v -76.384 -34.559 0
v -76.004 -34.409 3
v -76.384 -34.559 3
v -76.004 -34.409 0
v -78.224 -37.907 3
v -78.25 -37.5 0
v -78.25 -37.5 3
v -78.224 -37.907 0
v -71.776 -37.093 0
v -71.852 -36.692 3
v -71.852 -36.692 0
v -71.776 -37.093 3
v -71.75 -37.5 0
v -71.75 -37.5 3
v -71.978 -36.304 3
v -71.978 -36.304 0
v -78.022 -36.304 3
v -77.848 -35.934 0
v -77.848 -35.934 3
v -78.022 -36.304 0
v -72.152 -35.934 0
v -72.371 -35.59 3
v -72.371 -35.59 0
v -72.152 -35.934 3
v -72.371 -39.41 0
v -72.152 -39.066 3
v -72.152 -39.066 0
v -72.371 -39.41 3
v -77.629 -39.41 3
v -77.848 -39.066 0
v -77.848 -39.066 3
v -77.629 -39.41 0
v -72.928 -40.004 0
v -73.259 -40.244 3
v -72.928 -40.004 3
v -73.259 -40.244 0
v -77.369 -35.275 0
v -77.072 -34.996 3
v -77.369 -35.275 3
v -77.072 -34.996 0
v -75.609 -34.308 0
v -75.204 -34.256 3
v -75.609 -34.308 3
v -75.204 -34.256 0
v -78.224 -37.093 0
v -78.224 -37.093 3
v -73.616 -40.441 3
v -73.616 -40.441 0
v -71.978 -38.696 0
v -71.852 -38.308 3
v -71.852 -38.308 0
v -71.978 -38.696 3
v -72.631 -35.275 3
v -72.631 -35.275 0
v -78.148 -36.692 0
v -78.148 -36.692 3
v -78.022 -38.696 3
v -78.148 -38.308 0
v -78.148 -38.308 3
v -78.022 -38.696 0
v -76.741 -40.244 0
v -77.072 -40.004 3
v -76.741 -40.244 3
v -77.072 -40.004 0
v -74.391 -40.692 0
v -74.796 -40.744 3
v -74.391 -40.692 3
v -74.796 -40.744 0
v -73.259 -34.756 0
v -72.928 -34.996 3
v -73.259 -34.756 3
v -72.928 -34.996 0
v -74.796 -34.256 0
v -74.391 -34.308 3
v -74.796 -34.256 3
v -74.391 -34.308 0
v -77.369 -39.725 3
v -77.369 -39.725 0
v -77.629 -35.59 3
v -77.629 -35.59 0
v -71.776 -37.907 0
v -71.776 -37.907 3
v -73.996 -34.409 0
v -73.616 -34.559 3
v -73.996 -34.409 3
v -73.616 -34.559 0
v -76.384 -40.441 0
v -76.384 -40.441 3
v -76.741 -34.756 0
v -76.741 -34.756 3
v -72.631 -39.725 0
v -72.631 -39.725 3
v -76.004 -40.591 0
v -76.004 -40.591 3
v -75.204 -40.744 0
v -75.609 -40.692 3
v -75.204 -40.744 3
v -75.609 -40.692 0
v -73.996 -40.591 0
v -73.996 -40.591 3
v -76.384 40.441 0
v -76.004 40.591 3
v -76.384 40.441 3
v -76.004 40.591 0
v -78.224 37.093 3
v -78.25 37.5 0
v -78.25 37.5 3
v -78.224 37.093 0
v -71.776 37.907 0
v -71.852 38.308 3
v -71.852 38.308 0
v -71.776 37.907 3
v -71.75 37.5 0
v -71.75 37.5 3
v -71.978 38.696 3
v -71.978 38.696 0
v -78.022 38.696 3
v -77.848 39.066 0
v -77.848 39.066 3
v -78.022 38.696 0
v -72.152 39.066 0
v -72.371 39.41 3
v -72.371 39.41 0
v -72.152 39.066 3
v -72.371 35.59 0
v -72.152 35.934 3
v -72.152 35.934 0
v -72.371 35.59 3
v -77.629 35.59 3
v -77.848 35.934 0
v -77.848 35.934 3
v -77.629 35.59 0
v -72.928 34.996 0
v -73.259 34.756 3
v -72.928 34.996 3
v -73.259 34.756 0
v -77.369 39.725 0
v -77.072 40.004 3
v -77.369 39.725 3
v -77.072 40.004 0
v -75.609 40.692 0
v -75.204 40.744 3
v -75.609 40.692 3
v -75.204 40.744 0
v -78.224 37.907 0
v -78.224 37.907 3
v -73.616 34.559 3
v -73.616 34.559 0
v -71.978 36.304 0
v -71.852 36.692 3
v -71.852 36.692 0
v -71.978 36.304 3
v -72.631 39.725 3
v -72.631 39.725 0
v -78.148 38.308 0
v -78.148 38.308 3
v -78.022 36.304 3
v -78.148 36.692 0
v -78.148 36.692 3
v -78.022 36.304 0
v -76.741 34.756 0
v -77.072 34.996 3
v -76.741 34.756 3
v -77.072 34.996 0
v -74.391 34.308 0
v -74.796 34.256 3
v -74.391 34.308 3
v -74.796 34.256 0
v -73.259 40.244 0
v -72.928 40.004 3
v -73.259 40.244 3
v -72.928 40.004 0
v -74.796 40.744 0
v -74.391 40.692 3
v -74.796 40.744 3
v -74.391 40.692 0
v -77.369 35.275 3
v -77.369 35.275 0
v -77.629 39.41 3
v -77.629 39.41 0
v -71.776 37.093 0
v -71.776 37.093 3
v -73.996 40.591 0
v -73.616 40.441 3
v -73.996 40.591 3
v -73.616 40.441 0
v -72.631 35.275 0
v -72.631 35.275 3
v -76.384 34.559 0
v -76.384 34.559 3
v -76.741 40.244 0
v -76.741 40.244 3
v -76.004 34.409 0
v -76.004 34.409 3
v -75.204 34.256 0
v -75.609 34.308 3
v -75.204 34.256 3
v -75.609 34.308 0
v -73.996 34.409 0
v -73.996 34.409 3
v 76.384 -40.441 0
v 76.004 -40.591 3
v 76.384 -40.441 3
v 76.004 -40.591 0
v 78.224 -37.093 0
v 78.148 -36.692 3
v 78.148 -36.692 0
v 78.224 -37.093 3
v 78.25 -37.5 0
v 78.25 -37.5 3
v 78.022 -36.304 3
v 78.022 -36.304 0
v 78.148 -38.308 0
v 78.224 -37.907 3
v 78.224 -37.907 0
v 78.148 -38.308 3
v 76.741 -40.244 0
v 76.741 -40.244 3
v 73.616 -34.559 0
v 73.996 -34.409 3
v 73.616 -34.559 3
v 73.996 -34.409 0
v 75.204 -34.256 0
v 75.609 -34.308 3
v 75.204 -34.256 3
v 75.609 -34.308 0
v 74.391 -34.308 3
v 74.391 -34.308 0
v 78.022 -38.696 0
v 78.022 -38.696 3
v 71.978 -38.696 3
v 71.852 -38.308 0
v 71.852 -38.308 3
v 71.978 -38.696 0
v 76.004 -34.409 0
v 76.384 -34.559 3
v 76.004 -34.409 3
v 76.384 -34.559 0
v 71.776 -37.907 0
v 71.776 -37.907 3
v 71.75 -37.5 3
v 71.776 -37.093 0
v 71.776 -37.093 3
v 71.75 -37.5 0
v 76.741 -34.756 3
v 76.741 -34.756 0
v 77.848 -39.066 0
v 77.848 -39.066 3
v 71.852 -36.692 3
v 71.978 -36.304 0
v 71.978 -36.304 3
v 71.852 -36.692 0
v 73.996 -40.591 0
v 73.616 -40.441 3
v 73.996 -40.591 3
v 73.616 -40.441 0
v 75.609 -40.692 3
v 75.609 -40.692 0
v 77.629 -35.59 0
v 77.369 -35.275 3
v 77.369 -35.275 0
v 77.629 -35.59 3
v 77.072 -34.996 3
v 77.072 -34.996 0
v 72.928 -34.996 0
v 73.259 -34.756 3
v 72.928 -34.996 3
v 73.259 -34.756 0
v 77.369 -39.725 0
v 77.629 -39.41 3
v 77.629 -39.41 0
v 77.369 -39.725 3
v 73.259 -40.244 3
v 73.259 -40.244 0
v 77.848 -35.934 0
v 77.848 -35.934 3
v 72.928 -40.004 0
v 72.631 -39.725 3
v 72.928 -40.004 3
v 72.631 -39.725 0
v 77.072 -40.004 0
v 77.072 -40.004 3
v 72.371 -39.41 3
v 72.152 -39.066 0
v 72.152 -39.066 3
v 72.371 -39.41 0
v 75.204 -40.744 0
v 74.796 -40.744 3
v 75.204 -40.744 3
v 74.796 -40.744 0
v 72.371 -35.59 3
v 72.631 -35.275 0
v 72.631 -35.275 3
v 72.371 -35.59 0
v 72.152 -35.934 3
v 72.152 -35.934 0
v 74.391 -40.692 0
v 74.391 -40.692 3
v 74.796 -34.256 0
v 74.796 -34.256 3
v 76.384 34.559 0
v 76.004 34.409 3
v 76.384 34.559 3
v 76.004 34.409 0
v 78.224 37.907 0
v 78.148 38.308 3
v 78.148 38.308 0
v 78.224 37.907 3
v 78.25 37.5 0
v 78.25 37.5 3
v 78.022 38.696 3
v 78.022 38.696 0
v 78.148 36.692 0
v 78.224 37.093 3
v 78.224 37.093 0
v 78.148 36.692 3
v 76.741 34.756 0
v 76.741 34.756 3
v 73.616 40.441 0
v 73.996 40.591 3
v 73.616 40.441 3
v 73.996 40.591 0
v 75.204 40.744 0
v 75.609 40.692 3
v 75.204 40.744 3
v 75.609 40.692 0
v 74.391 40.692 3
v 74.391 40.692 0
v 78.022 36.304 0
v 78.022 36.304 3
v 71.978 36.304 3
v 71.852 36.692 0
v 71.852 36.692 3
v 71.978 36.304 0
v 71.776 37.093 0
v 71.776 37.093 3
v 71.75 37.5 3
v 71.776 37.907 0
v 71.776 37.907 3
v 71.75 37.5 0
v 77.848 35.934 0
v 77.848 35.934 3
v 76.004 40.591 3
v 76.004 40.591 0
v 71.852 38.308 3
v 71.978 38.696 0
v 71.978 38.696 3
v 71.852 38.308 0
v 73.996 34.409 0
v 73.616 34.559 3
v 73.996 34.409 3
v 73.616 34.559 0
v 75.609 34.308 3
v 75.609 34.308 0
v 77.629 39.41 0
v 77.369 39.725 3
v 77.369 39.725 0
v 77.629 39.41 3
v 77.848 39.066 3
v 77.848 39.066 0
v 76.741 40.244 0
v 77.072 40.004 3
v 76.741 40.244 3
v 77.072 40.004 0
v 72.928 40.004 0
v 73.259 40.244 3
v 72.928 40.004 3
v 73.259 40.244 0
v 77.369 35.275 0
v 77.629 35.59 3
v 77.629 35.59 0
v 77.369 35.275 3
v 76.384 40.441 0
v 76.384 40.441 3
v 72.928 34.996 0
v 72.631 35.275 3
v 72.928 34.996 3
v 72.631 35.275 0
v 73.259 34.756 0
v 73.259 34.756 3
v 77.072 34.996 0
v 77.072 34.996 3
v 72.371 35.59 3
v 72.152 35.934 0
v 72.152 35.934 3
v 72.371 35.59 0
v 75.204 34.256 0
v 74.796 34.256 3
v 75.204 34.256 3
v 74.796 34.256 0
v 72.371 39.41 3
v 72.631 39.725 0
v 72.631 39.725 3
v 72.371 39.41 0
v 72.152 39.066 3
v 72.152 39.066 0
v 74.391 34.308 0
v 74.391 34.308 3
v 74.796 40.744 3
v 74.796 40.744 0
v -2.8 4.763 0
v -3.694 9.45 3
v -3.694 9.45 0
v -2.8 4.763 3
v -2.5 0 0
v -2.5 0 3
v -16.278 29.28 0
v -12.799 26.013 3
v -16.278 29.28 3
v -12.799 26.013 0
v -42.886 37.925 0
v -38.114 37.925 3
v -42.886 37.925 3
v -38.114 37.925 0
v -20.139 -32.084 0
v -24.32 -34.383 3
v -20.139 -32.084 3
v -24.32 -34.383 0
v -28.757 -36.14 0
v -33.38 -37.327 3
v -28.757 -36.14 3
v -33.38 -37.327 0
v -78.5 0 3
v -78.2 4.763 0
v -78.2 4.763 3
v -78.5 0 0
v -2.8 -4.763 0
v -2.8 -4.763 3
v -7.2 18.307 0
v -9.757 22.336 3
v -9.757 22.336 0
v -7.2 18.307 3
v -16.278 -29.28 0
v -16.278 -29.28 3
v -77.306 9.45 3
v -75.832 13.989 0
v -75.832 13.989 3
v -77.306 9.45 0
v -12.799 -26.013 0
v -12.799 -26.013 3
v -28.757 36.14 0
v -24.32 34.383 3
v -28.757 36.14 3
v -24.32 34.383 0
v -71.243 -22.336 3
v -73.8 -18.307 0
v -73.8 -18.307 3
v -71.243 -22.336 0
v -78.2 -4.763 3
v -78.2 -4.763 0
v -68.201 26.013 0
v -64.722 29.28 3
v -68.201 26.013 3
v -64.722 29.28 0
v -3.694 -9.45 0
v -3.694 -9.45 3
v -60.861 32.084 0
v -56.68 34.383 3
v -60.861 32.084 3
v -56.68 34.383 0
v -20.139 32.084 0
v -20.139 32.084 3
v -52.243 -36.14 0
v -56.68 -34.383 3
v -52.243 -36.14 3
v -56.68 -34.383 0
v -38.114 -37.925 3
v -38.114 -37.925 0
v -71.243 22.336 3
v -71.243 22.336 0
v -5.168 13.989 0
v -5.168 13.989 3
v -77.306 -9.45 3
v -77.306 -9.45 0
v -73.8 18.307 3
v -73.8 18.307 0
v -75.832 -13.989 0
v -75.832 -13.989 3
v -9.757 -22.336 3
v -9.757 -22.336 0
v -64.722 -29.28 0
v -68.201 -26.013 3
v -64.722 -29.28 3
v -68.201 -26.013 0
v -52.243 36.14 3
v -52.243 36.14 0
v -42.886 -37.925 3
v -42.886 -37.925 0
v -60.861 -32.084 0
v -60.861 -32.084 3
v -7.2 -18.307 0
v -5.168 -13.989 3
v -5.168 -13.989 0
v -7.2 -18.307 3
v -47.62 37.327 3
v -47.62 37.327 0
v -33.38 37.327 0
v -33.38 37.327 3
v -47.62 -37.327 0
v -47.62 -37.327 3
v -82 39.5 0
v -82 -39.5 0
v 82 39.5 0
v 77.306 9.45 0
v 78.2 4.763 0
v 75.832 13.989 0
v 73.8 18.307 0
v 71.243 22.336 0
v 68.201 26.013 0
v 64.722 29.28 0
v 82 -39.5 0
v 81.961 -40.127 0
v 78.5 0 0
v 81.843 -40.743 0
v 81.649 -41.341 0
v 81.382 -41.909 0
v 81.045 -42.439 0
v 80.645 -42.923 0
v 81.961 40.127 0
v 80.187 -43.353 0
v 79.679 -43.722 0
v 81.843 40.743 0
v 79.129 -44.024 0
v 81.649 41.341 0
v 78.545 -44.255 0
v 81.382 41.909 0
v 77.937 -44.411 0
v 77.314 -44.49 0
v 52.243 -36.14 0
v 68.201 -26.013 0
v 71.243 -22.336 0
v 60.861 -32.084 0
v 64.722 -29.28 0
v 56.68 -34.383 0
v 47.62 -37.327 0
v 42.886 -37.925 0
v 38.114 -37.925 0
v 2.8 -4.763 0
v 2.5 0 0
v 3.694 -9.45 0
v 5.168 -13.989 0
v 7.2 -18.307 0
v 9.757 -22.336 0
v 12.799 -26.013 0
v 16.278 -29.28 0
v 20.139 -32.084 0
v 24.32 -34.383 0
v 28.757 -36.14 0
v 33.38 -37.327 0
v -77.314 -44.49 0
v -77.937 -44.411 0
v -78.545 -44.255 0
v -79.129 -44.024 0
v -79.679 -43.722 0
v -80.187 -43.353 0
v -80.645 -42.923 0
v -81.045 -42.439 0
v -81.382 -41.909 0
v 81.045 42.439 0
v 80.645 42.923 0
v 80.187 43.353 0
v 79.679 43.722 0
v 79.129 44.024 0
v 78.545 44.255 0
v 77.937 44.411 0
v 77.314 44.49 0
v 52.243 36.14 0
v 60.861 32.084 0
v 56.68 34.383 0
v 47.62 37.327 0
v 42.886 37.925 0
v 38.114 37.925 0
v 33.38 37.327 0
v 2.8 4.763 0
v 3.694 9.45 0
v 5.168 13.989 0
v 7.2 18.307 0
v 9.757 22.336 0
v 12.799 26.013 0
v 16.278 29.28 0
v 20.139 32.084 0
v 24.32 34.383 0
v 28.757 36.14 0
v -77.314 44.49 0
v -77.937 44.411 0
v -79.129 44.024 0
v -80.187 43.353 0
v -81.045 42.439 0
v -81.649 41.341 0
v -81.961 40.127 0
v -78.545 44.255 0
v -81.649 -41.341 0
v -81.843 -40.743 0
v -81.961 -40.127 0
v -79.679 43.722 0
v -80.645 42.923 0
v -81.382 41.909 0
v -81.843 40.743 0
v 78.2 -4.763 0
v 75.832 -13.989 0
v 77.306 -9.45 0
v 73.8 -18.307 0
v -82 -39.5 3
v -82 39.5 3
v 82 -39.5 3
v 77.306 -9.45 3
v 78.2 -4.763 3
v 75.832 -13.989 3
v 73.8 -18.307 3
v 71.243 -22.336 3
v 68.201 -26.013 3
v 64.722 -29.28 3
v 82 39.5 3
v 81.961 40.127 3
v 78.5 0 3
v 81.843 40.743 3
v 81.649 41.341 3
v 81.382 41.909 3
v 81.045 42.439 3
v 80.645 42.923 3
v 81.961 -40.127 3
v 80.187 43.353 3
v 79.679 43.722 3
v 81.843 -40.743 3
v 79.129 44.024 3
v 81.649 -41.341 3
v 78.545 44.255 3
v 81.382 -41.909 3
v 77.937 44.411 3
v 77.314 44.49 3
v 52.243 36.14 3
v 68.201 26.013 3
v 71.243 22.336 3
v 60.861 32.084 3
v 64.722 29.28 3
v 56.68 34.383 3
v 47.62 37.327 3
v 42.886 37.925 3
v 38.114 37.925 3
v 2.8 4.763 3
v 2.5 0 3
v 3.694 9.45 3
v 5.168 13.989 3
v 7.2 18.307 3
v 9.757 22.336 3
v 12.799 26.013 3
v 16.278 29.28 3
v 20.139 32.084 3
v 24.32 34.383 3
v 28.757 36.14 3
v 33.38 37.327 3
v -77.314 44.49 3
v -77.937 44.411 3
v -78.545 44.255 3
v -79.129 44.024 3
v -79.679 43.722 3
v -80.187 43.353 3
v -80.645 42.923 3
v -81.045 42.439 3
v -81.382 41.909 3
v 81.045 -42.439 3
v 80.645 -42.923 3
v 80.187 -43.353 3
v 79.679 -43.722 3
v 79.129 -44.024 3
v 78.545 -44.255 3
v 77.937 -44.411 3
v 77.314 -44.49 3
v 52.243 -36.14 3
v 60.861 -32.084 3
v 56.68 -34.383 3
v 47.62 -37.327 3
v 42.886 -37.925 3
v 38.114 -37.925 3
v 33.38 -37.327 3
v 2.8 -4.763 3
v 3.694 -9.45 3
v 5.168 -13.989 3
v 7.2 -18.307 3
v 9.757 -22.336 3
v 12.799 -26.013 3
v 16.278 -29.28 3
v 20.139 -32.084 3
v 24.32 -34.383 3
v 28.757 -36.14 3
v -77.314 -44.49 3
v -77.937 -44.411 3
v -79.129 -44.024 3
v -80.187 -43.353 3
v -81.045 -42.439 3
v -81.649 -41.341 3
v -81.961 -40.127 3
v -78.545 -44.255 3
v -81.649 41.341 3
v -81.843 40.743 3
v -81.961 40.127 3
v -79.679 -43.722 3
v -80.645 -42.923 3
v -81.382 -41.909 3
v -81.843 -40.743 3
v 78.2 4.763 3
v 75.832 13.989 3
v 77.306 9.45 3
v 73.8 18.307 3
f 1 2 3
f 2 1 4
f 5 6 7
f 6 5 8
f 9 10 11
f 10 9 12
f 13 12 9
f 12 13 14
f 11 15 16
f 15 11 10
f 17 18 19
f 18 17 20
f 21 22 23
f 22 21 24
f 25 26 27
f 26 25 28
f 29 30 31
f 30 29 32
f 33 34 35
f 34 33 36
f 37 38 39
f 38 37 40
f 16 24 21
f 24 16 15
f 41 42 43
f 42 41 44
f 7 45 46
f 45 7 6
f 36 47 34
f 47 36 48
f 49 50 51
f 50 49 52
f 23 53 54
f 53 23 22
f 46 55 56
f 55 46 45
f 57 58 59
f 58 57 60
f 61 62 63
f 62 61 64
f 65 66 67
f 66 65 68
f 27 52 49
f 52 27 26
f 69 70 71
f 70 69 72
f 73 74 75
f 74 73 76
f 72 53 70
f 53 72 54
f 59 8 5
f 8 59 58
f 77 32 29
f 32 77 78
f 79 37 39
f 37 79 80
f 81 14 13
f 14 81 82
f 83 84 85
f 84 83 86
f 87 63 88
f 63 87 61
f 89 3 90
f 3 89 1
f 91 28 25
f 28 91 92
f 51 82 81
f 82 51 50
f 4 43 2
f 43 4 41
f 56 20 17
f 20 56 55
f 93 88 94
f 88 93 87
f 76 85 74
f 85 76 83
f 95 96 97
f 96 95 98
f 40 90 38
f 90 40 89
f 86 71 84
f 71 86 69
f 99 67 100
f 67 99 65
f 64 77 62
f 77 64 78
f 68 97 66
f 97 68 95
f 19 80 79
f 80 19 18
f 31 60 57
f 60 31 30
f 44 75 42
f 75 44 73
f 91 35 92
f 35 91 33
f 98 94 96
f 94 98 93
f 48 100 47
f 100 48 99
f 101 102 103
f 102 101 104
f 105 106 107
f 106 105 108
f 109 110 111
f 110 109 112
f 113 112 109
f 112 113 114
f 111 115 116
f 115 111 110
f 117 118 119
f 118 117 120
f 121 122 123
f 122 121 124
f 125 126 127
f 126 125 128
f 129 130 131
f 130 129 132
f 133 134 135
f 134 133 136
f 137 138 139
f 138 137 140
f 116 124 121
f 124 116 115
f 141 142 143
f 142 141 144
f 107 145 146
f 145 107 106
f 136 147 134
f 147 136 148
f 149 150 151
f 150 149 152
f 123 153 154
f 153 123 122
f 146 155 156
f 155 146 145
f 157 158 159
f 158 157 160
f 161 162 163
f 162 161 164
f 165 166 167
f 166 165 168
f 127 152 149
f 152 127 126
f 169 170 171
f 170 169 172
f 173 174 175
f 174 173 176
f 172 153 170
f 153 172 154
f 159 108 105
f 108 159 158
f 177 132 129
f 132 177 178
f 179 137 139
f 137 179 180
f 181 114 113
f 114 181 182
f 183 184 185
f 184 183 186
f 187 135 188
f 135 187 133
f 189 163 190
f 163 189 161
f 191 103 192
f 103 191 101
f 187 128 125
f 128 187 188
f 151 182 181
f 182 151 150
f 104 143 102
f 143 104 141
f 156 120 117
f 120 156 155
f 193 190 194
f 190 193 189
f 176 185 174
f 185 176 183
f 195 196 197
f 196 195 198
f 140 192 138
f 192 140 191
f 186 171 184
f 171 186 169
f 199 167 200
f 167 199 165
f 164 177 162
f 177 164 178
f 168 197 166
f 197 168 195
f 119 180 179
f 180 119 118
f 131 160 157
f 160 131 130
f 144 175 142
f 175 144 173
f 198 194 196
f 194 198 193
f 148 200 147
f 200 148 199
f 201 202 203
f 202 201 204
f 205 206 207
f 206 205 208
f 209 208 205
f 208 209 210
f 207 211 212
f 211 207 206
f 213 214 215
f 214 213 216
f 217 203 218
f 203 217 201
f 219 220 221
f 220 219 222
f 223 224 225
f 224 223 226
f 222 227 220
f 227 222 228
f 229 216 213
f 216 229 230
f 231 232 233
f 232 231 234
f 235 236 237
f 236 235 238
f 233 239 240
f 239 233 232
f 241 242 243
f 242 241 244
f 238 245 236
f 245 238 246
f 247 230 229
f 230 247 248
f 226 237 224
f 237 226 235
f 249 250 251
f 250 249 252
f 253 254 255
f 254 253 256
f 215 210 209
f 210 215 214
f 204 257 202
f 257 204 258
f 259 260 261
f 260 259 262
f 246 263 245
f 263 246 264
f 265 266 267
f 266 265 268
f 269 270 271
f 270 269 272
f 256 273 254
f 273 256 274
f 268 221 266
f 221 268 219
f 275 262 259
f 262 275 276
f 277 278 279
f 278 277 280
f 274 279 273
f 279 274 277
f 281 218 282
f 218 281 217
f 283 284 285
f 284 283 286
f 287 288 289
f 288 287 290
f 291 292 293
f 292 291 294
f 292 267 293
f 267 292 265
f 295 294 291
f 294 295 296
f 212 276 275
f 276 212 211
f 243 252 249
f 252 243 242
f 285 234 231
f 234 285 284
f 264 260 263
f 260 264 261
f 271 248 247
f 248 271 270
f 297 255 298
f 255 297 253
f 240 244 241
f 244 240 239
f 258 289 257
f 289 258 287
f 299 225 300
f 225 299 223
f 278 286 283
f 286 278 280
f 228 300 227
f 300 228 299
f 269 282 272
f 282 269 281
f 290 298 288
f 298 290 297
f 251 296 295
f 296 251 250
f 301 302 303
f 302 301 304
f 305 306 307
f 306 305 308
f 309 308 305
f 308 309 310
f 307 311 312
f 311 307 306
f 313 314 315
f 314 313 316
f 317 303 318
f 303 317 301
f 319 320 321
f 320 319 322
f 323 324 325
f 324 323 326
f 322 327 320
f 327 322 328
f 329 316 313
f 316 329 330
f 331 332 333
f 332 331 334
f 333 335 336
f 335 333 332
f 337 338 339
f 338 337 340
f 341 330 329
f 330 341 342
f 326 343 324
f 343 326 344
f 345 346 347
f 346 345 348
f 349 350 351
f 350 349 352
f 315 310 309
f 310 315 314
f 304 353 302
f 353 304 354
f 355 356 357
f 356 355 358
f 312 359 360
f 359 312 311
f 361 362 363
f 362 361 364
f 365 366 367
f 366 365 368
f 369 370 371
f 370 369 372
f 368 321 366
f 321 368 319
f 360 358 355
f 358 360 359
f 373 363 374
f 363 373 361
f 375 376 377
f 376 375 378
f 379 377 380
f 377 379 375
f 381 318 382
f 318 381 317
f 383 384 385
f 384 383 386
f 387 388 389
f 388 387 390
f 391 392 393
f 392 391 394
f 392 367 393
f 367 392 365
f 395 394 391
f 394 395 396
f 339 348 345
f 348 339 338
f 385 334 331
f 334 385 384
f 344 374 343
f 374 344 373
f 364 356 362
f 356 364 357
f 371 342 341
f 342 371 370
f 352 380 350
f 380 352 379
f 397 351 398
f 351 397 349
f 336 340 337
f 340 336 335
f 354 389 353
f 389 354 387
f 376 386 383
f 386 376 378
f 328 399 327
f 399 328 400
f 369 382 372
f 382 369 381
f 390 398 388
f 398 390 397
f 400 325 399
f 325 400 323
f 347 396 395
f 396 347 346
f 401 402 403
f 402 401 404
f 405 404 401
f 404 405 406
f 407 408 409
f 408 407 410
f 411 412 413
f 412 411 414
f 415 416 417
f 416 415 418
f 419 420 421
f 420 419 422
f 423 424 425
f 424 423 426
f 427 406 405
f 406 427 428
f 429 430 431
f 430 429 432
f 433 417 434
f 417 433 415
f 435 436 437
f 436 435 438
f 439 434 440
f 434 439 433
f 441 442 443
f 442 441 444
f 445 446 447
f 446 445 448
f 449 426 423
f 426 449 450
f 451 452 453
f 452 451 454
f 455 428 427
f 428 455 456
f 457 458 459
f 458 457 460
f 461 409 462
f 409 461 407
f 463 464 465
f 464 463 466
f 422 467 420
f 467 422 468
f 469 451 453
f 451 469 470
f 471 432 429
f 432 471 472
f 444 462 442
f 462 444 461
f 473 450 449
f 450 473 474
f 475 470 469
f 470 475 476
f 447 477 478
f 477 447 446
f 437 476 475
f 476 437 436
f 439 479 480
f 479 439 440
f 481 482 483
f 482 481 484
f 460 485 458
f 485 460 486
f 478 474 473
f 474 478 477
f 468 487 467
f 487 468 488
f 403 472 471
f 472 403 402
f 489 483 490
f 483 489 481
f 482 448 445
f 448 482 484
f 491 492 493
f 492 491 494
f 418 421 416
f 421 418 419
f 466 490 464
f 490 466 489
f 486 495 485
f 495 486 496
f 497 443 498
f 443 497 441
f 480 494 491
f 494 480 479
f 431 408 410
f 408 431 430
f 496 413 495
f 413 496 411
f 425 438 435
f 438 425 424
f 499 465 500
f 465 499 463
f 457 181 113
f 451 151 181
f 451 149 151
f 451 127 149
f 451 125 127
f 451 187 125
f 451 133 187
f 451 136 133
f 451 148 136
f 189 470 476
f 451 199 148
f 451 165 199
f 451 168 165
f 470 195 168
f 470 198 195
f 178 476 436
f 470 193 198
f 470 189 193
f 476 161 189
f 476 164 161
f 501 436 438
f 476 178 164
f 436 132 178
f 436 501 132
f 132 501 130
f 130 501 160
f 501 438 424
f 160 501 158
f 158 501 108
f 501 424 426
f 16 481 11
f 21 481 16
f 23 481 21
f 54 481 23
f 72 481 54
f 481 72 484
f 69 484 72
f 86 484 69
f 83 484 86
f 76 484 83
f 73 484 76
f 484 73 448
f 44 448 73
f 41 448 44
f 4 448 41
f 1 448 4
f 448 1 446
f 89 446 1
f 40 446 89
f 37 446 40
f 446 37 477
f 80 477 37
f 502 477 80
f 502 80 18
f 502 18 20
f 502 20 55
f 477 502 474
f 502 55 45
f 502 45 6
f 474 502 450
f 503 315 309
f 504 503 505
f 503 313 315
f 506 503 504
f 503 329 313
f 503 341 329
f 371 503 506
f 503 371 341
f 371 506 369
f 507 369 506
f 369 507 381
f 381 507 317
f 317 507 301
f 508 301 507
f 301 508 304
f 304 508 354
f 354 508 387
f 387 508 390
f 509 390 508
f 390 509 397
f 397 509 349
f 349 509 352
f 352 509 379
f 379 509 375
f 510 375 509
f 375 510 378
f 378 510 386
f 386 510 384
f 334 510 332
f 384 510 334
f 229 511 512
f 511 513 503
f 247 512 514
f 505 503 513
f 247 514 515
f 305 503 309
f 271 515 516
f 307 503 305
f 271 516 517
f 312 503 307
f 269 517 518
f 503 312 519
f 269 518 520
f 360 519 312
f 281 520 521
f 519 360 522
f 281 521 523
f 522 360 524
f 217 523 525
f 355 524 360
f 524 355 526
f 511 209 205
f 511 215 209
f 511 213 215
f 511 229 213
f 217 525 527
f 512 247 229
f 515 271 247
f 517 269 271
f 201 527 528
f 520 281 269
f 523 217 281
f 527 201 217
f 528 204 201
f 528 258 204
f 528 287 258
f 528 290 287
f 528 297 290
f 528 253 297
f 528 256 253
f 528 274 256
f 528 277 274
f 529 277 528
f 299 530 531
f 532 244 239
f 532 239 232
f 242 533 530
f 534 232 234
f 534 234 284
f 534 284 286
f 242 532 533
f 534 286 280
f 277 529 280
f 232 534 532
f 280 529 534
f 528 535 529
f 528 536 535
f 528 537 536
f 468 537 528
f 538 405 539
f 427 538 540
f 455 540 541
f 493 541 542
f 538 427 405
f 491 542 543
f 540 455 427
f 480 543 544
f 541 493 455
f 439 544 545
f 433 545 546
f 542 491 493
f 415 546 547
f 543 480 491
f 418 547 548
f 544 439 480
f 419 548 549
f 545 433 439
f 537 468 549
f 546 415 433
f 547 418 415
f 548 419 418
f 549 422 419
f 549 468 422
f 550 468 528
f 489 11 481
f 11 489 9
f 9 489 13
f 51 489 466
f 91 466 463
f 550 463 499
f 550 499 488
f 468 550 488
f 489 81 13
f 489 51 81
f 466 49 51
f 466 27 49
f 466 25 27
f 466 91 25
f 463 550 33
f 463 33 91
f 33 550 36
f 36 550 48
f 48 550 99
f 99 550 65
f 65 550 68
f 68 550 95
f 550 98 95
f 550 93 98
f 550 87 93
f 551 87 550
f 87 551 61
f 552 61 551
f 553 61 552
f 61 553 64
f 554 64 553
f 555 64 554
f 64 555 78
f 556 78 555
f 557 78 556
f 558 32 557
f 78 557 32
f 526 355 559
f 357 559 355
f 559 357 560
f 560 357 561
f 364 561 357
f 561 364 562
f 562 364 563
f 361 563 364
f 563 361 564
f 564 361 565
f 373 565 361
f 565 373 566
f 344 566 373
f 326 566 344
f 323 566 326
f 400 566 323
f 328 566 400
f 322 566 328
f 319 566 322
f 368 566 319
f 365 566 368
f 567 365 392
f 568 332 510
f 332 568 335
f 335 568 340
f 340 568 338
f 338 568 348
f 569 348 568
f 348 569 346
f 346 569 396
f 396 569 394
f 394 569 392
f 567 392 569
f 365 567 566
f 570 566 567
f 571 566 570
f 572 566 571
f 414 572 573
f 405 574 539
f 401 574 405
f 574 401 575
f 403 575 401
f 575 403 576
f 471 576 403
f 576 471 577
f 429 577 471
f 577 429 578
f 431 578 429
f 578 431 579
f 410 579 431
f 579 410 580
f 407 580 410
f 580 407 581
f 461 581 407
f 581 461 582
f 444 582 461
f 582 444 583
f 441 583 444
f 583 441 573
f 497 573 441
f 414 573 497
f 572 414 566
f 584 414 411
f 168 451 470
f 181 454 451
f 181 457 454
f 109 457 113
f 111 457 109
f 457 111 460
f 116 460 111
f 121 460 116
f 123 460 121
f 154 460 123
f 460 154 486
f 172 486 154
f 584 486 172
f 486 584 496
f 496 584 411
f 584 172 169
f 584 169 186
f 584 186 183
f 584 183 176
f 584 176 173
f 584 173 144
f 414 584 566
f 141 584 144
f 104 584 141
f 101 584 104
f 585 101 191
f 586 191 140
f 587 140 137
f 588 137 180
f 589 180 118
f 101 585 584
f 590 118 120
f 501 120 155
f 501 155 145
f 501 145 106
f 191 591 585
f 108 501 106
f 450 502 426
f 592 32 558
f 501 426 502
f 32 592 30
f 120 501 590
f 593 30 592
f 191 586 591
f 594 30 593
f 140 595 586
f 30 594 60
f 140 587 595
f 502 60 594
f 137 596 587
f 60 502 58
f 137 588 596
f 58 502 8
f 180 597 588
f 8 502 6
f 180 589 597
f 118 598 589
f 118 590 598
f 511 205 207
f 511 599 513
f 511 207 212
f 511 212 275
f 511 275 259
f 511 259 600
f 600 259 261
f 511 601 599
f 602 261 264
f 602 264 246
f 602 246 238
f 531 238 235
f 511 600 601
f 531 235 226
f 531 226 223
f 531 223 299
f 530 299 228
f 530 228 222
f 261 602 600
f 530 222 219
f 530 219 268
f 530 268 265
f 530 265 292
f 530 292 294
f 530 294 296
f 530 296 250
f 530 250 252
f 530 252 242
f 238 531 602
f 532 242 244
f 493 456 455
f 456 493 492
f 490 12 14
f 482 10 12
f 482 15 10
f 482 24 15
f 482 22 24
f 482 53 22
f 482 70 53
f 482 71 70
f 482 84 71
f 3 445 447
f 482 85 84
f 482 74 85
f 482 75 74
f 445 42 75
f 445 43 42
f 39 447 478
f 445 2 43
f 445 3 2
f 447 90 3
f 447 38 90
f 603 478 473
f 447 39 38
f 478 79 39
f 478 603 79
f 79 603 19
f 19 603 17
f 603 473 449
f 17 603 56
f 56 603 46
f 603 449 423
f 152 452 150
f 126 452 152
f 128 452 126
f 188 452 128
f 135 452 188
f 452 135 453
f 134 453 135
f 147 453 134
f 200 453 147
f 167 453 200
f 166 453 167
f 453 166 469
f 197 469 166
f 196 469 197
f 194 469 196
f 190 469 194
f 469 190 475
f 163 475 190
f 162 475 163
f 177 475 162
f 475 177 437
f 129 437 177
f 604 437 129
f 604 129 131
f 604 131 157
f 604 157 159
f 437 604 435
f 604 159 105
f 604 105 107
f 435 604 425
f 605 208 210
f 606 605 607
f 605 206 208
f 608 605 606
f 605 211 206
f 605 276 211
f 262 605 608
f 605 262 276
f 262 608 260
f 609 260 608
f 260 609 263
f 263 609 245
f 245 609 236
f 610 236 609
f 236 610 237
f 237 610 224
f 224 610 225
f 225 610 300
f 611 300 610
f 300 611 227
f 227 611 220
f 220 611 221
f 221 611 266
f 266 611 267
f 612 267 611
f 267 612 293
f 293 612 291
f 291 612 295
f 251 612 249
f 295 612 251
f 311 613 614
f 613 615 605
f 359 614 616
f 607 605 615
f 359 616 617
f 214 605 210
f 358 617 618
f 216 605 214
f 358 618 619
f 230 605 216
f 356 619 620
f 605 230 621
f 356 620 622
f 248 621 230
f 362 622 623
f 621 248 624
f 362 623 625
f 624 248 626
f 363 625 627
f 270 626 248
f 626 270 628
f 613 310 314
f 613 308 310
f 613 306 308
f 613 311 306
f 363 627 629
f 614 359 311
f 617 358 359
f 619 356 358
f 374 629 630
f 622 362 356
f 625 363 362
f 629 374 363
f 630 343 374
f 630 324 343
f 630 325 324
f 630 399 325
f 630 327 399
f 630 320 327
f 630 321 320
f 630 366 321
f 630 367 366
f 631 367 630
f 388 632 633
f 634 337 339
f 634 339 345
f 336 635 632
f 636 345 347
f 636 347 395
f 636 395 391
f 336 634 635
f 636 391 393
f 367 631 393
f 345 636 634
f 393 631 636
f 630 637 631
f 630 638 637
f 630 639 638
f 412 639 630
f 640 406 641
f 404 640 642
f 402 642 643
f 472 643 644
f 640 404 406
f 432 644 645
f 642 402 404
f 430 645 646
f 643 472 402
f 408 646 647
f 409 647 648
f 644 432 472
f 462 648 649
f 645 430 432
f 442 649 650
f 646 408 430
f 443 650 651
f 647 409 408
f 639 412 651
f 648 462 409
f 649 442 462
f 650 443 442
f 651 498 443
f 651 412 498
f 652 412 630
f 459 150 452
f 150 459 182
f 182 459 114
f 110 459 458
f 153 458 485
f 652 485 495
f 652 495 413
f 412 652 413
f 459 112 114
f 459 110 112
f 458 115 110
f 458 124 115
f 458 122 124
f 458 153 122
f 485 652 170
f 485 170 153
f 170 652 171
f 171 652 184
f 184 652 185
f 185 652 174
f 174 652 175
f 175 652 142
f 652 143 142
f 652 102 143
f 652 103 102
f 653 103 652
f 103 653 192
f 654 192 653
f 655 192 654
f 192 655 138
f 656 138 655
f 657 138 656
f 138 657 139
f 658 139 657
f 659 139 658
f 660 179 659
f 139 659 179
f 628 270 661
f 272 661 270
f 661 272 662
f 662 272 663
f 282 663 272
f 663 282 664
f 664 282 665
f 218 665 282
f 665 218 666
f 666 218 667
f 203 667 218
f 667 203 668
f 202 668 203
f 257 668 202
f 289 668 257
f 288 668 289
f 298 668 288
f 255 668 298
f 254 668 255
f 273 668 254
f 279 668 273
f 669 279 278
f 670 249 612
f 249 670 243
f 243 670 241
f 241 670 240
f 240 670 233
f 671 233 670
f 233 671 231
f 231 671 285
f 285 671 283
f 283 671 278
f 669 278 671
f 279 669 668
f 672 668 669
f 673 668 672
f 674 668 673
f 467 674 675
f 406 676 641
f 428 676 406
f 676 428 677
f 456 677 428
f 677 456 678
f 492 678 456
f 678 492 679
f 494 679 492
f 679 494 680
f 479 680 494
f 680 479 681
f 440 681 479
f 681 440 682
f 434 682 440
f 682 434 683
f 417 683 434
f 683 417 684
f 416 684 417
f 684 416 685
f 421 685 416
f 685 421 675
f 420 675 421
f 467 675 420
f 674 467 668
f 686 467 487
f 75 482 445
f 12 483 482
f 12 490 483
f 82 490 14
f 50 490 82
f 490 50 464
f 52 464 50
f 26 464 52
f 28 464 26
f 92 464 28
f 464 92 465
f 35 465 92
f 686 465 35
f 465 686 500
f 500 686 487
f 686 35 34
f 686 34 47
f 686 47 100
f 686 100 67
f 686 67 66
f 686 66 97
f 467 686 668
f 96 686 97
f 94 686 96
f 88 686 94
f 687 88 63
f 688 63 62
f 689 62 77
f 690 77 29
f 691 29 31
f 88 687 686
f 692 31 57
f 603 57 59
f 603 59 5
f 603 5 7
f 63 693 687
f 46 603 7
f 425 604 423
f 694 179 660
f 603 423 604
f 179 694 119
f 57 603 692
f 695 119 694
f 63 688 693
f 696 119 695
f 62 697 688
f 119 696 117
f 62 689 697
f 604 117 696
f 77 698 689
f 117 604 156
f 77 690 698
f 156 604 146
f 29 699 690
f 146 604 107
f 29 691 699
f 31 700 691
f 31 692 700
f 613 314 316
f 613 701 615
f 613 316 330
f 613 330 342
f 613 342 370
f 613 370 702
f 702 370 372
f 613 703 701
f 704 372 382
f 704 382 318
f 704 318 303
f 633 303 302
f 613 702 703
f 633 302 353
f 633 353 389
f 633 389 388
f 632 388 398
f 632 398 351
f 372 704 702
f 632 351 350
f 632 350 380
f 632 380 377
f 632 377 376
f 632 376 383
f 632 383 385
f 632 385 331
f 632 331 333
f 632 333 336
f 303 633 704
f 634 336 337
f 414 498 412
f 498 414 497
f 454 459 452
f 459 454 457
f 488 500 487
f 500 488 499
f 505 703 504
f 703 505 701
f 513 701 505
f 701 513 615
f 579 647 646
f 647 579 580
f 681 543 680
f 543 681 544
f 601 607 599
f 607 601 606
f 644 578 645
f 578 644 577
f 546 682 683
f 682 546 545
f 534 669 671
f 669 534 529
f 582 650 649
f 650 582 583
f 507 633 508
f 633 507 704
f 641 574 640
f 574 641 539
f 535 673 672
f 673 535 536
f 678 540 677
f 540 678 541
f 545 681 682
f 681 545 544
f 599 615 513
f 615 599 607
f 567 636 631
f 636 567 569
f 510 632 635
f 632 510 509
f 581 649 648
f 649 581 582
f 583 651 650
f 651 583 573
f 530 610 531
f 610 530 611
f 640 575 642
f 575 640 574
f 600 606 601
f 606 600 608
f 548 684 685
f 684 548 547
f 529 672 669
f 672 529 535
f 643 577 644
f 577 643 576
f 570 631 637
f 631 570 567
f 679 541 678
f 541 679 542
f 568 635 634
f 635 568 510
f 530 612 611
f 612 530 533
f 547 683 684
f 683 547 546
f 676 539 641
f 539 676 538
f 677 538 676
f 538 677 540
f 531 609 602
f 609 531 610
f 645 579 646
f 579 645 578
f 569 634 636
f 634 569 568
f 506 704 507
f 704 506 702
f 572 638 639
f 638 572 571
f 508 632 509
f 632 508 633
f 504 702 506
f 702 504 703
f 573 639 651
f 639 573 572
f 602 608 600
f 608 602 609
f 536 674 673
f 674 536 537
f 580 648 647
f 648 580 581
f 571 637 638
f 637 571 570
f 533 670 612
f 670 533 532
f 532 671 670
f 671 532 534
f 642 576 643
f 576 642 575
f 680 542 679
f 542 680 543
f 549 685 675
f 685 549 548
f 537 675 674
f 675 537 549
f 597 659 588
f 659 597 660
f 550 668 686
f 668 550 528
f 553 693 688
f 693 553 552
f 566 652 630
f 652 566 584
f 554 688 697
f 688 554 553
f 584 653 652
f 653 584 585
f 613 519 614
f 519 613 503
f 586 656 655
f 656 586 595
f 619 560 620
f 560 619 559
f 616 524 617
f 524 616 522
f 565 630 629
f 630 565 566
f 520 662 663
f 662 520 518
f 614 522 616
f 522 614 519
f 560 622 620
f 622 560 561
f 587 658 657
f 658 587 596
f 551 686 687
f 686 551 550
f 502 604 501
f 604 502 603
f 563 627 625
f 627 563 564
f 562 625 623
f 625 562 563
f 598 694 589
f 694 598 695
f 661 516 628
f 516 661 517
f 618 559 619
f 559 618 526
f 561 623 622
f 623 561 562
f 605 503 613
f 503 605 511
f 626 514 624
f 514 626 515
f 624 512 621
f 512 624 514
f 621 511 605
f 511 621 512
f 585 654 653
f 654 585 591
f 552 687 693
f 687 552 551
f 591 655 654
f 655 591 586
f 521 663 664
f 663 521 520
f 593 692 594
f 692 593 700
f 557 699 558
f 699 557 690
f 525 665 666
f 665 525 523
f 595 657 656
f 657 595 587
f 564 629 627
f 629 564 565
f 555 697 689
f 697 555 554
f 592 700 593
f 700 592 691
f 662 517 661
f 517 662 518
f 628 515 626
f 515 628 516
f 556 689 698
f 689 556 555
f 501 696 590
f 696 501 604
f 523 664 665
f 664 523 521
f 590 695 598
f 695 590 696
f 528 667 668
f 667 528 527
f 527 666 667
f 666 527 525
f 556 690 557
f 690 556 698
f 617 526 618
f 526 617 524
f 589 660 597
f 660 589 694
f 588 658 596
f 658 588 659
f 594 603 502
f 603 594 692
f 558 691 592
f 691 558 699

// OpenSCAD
$fn = 50;

difference() {
	union() {
		hull() {
			translate(v = [-77.0, 39.5, 0]) {
				cylinder(h = 3, r = 5);
			}
			translate(v = [77.0, 39.5, 0]) {
				cylinder(h = 3, r = 5);
			}
			translate(v = [-77.0, -39.5, 0]) {
				cylinder(h = 3, r = 5);
			}
			translate(v = [77.0, -39.5, 0]) {
				cylinder(h = 3, r = 5);
			}
		}
	}
	union() {
		translate(v = [-75.0, -37.5, -100.0]) {
			cylinder(h = 200, r = 3.25);
		}
		translate(v = [-75.0, 37.5, -100.0]) {
			cylinder(h = 200, r = 3.25);
		}
		translate(v = [75.0, -37.5, -100.0]) {
			cylinder(h = 200, r = 3.25);
		}
		translate(v = [75.0, 37.5, -100.0]) {
			cylinder(h = 200, r = 3.25);
		}
		translate(v = [-75.0, -37.5, -100.0]) {
			cylinder(h = 200, r = 1.8);
		}
		translate(v = [-75.0, 37.5, -100.0]) {
			cylinder(h = 200, r = 1.8);
		}
		translate(v = [75.0, -37.5, -100.0]) {
			cylinder(h = 200, r = 1.8);
		}
		translate(v = [75.0, 37.5, -100.0]) {
			cylinder(h = 200, r = 1.8);
		}
		translate(v = [-40.5, 0, 0.0]) {
			cylinder(h = 3, r = 38.0);
		}
		translate(v = [40.5, 0, 0.0]) {
			cylinder(h = 3, r = 38.0);
		}
	}
}
